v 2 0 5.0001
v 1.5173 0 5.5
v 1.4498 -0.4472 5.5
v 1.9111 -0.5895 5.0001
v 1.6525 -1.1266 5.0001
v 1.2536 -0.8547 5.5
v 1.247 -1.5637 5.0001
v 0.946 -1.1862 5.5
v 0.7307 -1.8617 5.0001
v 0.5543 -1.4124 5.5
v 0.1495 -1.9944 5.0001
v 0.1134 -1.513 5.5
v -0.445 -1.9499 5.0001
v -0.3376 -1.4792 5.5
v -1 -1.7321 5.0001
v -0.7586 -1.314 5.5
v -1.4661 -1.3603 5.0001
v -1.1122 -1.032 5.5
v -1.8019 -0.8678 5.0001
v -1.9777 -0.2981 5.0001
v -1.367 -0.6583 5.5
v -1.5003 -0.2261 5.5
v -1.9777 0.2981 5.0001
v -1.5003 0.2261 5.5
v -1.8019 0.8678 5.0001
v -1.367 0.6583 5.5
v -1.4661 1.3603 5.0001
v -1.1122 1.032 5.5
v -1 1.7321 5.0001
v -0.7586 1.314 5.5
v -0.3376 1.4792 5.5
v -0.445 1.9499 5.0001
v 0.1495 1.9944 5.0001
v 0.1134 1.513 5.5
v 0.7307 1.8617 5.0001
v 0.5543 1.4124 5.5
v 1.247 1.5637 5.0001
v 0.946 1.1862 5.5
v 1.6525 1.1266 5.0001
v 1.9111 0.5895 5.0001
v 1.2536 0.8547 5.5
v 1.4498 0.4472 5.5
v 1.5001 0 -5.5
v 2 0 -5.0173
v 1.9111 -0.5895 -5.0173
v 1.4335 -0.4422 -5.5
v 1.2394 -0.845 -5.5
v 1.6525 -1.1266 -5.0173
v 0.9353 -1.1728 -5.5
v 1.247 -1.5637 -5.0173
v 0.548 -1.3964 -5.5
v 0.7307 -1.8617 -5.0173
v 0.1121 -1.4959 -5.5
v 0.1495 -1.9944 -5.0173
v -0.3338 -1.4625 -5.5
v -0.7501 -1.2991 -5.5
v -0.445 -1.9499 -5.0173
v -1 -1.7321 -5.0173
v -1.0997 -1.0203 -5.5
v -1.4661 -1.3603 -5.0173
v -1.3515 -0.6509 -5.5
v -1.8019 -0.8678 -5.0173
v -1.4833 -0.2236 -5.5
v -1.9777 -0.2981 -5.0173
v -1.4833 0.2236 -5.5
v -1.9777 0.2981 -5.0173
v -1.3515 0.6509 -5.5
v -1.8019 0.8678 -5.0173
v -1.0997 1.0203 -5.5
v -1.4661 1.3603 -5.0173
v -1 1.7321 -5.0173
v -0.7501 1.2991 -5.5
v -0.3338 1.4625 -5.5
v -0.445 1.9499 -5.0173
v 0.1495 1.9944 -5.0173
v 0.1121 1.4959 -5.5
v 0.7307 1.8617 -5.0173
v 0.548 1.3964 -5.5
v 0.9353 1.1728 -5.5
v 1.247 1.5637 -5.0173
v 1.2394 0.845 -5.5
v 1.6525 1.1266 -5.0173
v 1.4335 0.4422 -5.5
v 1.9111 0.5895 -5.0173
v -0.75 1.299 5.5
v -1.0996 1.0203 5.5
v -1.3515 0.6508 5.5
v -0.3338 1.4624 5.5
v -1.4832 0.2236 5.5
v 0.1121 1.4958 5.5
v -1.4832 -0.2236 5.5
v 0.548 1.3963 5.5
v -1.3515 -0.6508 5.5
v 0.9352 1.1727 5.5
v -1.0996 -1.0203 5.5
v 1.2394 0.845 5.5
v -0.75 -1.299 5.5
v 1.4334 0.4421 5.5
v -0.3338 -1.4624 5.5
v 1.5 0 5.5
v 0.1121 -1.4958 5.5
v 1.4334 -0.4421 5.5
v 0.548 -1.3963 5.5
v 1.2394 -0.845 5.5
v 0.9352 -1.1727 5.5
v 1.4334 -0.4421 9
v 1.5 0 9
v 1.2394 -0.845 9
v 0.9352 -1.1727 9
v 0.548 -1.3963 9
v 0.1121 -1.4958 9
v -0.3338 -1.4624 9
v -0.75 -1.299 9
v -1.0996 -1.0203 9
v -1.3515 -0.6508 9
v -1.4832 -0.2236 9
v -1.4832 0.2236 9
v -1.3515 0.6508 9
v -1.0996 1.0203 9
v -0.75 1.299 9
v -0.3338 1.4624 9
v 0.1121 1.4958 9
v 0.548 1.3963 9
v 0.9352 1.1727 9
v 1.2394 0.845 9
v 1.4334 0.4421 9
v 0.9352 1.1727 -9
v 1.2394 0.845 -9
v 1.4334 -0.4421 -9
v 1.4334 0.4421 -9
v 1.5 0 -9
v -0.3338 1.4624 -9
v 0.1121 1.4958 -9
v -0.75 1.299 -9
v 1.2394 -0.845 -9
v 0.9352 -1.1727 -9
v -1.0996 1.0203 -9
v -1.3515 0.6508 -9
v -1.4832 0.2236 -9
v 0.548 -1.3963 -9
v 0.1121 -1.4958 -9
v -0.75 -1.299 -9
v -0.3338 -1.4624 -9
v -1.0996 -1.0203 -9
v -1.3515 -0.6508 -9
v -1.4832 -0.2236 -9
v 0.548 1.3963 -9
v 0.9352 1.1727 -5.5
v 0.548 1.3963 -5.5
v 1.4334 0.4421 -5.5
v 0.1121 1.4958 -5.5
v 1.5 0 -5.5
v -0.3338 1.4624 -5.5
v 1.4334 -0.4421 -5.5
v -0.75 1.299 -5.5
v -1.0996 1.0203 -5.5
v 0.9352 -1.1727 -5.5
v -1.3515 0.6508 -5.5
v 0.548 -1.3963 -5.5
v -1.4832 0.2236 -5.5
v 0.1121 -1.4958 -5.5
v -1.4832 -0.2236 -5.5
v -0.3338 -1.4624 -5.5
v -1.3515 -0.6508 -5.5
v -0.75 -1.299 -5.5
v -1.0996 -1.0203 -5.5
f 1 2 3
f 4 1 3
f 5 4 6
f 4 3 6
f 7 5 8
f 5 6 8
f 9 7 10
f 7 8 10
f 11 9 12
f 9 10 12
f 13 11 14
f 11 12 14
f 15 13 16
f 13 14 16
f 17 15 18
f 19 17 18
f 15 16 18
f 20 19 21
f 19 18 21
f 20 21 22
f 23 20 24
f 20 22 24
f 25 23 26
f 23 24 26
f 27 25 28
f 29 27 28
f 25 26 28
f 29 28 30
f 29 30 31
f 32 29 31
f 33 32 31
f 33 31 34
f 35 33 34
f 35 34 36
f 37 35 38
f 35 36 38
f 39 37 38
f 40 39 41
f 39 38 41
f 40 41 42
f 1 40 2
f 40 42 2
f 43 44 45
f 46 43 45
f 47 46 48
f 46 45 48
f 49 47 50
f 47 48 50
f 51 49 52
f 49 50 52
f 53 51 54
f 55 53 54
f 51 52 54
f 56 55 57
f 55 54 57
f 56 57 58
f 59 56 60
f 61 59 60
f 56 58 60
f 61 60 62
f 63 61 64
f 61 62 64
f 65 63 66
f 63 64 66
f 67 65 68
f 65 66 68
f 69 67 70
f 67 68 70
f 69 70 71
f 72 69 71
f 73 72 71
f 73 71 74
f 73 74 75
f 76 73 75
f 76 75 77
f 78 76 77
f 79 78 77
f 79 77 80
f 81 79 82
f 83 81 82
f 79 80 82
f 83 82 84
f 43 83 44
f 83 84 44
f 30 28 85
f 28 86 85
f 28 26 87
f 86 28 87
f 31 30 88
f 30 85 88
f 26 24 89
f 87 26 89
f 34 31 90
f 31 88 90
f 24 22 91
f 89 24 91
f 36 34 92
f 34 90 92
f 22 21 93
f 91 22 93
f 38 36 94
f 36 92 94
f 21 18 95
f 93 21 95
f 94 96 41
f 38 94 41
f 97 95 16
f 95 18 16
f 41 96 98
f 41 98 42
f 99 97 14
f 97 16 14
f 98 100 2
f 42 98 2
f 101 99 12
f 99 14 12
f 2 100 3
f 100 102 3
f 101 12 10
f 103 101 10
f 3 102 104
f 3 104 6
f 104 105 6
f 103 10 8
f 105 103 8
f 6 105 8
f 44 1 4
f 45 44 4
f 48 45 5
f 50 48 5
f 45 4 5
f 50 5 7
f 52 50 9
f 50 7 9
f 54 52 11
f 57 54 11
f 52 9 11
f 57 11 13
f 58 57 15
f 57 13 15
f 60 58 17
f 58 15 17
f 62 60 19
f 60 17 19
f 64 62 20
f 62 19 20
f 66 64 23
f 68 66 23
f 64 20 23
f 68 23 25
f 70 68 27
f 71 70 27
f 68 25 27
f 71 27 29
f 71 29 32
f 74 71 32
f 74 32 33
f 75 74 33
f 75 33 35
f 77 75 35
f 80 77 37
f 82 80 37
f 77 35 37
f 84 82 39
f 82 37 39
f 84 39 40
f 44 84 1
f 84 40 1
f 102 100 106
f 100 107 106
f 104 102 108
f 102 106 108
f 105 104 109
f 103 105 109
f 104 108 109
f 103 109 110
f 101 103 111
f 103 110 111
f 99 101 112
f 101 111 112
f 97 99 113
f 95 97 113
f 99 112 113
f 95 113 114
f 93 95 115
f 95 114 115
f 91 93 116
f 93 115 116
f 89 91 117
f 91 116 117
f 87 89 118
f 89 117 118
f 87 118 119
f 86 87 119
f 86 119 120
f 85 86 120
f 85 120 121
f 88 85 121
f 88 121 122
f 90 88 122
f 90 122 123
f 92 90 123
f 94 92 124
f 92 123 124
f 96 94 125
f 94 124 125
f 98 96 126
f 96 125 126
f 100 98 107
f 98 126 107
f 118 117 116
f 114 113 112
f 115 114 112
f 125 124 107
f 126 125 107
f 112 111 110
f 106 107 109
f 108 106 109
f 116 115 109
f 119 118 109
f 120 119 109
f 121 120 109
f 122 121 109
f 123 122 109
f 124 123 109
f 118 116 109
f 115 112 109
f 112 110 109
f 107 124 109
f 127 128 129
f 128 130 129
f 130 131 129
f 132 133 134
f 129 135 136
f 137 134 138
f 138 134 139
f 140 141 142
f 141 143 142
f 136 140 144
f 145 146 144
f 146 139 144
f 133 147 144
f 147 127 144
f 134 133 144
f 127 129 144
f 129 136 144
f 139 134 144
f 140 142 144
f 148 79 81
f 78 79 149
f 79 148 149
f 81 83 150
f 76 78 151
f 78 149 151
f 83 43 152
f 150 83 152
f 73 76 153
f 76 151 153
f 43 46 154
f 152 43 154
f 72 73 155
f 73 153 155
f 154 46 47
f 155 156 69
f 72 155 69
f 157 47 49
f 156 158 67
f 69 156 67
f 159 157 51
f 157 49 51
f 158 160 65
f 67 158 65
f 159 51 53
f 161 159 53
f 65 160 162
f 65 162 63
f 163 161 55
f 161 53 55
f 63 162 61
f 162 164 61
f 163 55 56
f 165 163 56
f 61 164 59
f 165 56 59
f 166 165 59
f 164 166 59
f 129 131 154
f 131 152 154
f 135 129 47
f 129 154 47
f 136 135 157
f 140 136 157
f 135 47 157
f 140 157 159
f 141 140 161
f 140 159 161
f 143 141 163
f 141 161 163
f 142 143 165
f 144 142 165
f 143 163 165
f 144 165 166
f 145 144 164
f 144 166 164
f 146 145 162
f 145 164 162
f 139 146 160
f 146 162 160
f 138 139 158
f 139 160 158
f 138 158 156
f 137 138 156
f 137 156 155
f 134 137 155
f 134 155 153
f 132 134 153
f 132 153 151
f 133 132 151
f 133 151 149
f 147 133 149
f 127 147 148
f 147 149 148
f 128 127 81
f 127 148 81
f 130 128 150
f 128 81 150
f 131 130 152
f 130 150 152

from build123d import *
from OCP.BRepFilletAPI import BRepFilletAPI_MakeChamfer

# Parameters (mm, degrees)
CHAMFER1_SIZE   = 0.5
CHAMFER1_SIZE_2 = 0.482844387


with BuildPart() as part:
    # Sketch1 → Revolve1 (revolve)
    with BuildSketch(Plane(origin=(0, 0, 0), x_dir=(0, 0, -1), z_dir=(1, 0, 0)), mode=Mode.PRIVATE) as revolve1_sk:
        Polygon((-9, 0), (9, 0), (9, 1.5), (5.5, 1.5), (5.5, 2), (-5.5, 2), (-5.5, 1.5), (-9, 1.5), align=None)
    revolve(revolve1_sk.sketch.rotate(Axis((0, 0, 9), (0, 0, -1)), 90), axis=Axis((0, 0, 9), (0, 0, -1)))

    # Chamfer1
    chamfer1_edges_1 = [part.edges().sort_by_distance(p)[0] for p in [
        (-2, 0, -5.5),
    ]]
    chamfer1_side_1 = [part.faces().sort_by_distance(p)[0] for p in [
        (-1.990343112, 0, -5.5),
    ]]
    chamfer1_edges_2 = [part.edges().sort_by_distance(p)[0] for p in [
        (-2, 0, 5.5),
    ]]
    chamfer1_side_2 = [part.faces().sort_by_distance(p)[0] for p in [
        (-2, 0, 5.490343112),
    ]]
    chamfer1 = BRepFilletAPI_MakeChamfer(part.part.solid().wrapped)
    for e in chamfer1_edges_1:
        chamfer1.Add(CHAMFER1_SIZE - 0.0001, CHAMFER1_SIZE_2 - 0.0001, e.wrapped, chamfer1_side_1[0].wrapped)
    for e in chamfer1_edges_2:
        chamfer1.Add(CHAMFER1_SIZE - 0.0001, CHAMFER1_SIZE_2 - 0.0001, e.wrapped, chamfer1_side_2[0].wrapped)
    add(Compound.cast(chamfer1.Shape()), mode=Mode.REPLACE)  # a hair under: the kernel refuses the full size


solid = part.part
